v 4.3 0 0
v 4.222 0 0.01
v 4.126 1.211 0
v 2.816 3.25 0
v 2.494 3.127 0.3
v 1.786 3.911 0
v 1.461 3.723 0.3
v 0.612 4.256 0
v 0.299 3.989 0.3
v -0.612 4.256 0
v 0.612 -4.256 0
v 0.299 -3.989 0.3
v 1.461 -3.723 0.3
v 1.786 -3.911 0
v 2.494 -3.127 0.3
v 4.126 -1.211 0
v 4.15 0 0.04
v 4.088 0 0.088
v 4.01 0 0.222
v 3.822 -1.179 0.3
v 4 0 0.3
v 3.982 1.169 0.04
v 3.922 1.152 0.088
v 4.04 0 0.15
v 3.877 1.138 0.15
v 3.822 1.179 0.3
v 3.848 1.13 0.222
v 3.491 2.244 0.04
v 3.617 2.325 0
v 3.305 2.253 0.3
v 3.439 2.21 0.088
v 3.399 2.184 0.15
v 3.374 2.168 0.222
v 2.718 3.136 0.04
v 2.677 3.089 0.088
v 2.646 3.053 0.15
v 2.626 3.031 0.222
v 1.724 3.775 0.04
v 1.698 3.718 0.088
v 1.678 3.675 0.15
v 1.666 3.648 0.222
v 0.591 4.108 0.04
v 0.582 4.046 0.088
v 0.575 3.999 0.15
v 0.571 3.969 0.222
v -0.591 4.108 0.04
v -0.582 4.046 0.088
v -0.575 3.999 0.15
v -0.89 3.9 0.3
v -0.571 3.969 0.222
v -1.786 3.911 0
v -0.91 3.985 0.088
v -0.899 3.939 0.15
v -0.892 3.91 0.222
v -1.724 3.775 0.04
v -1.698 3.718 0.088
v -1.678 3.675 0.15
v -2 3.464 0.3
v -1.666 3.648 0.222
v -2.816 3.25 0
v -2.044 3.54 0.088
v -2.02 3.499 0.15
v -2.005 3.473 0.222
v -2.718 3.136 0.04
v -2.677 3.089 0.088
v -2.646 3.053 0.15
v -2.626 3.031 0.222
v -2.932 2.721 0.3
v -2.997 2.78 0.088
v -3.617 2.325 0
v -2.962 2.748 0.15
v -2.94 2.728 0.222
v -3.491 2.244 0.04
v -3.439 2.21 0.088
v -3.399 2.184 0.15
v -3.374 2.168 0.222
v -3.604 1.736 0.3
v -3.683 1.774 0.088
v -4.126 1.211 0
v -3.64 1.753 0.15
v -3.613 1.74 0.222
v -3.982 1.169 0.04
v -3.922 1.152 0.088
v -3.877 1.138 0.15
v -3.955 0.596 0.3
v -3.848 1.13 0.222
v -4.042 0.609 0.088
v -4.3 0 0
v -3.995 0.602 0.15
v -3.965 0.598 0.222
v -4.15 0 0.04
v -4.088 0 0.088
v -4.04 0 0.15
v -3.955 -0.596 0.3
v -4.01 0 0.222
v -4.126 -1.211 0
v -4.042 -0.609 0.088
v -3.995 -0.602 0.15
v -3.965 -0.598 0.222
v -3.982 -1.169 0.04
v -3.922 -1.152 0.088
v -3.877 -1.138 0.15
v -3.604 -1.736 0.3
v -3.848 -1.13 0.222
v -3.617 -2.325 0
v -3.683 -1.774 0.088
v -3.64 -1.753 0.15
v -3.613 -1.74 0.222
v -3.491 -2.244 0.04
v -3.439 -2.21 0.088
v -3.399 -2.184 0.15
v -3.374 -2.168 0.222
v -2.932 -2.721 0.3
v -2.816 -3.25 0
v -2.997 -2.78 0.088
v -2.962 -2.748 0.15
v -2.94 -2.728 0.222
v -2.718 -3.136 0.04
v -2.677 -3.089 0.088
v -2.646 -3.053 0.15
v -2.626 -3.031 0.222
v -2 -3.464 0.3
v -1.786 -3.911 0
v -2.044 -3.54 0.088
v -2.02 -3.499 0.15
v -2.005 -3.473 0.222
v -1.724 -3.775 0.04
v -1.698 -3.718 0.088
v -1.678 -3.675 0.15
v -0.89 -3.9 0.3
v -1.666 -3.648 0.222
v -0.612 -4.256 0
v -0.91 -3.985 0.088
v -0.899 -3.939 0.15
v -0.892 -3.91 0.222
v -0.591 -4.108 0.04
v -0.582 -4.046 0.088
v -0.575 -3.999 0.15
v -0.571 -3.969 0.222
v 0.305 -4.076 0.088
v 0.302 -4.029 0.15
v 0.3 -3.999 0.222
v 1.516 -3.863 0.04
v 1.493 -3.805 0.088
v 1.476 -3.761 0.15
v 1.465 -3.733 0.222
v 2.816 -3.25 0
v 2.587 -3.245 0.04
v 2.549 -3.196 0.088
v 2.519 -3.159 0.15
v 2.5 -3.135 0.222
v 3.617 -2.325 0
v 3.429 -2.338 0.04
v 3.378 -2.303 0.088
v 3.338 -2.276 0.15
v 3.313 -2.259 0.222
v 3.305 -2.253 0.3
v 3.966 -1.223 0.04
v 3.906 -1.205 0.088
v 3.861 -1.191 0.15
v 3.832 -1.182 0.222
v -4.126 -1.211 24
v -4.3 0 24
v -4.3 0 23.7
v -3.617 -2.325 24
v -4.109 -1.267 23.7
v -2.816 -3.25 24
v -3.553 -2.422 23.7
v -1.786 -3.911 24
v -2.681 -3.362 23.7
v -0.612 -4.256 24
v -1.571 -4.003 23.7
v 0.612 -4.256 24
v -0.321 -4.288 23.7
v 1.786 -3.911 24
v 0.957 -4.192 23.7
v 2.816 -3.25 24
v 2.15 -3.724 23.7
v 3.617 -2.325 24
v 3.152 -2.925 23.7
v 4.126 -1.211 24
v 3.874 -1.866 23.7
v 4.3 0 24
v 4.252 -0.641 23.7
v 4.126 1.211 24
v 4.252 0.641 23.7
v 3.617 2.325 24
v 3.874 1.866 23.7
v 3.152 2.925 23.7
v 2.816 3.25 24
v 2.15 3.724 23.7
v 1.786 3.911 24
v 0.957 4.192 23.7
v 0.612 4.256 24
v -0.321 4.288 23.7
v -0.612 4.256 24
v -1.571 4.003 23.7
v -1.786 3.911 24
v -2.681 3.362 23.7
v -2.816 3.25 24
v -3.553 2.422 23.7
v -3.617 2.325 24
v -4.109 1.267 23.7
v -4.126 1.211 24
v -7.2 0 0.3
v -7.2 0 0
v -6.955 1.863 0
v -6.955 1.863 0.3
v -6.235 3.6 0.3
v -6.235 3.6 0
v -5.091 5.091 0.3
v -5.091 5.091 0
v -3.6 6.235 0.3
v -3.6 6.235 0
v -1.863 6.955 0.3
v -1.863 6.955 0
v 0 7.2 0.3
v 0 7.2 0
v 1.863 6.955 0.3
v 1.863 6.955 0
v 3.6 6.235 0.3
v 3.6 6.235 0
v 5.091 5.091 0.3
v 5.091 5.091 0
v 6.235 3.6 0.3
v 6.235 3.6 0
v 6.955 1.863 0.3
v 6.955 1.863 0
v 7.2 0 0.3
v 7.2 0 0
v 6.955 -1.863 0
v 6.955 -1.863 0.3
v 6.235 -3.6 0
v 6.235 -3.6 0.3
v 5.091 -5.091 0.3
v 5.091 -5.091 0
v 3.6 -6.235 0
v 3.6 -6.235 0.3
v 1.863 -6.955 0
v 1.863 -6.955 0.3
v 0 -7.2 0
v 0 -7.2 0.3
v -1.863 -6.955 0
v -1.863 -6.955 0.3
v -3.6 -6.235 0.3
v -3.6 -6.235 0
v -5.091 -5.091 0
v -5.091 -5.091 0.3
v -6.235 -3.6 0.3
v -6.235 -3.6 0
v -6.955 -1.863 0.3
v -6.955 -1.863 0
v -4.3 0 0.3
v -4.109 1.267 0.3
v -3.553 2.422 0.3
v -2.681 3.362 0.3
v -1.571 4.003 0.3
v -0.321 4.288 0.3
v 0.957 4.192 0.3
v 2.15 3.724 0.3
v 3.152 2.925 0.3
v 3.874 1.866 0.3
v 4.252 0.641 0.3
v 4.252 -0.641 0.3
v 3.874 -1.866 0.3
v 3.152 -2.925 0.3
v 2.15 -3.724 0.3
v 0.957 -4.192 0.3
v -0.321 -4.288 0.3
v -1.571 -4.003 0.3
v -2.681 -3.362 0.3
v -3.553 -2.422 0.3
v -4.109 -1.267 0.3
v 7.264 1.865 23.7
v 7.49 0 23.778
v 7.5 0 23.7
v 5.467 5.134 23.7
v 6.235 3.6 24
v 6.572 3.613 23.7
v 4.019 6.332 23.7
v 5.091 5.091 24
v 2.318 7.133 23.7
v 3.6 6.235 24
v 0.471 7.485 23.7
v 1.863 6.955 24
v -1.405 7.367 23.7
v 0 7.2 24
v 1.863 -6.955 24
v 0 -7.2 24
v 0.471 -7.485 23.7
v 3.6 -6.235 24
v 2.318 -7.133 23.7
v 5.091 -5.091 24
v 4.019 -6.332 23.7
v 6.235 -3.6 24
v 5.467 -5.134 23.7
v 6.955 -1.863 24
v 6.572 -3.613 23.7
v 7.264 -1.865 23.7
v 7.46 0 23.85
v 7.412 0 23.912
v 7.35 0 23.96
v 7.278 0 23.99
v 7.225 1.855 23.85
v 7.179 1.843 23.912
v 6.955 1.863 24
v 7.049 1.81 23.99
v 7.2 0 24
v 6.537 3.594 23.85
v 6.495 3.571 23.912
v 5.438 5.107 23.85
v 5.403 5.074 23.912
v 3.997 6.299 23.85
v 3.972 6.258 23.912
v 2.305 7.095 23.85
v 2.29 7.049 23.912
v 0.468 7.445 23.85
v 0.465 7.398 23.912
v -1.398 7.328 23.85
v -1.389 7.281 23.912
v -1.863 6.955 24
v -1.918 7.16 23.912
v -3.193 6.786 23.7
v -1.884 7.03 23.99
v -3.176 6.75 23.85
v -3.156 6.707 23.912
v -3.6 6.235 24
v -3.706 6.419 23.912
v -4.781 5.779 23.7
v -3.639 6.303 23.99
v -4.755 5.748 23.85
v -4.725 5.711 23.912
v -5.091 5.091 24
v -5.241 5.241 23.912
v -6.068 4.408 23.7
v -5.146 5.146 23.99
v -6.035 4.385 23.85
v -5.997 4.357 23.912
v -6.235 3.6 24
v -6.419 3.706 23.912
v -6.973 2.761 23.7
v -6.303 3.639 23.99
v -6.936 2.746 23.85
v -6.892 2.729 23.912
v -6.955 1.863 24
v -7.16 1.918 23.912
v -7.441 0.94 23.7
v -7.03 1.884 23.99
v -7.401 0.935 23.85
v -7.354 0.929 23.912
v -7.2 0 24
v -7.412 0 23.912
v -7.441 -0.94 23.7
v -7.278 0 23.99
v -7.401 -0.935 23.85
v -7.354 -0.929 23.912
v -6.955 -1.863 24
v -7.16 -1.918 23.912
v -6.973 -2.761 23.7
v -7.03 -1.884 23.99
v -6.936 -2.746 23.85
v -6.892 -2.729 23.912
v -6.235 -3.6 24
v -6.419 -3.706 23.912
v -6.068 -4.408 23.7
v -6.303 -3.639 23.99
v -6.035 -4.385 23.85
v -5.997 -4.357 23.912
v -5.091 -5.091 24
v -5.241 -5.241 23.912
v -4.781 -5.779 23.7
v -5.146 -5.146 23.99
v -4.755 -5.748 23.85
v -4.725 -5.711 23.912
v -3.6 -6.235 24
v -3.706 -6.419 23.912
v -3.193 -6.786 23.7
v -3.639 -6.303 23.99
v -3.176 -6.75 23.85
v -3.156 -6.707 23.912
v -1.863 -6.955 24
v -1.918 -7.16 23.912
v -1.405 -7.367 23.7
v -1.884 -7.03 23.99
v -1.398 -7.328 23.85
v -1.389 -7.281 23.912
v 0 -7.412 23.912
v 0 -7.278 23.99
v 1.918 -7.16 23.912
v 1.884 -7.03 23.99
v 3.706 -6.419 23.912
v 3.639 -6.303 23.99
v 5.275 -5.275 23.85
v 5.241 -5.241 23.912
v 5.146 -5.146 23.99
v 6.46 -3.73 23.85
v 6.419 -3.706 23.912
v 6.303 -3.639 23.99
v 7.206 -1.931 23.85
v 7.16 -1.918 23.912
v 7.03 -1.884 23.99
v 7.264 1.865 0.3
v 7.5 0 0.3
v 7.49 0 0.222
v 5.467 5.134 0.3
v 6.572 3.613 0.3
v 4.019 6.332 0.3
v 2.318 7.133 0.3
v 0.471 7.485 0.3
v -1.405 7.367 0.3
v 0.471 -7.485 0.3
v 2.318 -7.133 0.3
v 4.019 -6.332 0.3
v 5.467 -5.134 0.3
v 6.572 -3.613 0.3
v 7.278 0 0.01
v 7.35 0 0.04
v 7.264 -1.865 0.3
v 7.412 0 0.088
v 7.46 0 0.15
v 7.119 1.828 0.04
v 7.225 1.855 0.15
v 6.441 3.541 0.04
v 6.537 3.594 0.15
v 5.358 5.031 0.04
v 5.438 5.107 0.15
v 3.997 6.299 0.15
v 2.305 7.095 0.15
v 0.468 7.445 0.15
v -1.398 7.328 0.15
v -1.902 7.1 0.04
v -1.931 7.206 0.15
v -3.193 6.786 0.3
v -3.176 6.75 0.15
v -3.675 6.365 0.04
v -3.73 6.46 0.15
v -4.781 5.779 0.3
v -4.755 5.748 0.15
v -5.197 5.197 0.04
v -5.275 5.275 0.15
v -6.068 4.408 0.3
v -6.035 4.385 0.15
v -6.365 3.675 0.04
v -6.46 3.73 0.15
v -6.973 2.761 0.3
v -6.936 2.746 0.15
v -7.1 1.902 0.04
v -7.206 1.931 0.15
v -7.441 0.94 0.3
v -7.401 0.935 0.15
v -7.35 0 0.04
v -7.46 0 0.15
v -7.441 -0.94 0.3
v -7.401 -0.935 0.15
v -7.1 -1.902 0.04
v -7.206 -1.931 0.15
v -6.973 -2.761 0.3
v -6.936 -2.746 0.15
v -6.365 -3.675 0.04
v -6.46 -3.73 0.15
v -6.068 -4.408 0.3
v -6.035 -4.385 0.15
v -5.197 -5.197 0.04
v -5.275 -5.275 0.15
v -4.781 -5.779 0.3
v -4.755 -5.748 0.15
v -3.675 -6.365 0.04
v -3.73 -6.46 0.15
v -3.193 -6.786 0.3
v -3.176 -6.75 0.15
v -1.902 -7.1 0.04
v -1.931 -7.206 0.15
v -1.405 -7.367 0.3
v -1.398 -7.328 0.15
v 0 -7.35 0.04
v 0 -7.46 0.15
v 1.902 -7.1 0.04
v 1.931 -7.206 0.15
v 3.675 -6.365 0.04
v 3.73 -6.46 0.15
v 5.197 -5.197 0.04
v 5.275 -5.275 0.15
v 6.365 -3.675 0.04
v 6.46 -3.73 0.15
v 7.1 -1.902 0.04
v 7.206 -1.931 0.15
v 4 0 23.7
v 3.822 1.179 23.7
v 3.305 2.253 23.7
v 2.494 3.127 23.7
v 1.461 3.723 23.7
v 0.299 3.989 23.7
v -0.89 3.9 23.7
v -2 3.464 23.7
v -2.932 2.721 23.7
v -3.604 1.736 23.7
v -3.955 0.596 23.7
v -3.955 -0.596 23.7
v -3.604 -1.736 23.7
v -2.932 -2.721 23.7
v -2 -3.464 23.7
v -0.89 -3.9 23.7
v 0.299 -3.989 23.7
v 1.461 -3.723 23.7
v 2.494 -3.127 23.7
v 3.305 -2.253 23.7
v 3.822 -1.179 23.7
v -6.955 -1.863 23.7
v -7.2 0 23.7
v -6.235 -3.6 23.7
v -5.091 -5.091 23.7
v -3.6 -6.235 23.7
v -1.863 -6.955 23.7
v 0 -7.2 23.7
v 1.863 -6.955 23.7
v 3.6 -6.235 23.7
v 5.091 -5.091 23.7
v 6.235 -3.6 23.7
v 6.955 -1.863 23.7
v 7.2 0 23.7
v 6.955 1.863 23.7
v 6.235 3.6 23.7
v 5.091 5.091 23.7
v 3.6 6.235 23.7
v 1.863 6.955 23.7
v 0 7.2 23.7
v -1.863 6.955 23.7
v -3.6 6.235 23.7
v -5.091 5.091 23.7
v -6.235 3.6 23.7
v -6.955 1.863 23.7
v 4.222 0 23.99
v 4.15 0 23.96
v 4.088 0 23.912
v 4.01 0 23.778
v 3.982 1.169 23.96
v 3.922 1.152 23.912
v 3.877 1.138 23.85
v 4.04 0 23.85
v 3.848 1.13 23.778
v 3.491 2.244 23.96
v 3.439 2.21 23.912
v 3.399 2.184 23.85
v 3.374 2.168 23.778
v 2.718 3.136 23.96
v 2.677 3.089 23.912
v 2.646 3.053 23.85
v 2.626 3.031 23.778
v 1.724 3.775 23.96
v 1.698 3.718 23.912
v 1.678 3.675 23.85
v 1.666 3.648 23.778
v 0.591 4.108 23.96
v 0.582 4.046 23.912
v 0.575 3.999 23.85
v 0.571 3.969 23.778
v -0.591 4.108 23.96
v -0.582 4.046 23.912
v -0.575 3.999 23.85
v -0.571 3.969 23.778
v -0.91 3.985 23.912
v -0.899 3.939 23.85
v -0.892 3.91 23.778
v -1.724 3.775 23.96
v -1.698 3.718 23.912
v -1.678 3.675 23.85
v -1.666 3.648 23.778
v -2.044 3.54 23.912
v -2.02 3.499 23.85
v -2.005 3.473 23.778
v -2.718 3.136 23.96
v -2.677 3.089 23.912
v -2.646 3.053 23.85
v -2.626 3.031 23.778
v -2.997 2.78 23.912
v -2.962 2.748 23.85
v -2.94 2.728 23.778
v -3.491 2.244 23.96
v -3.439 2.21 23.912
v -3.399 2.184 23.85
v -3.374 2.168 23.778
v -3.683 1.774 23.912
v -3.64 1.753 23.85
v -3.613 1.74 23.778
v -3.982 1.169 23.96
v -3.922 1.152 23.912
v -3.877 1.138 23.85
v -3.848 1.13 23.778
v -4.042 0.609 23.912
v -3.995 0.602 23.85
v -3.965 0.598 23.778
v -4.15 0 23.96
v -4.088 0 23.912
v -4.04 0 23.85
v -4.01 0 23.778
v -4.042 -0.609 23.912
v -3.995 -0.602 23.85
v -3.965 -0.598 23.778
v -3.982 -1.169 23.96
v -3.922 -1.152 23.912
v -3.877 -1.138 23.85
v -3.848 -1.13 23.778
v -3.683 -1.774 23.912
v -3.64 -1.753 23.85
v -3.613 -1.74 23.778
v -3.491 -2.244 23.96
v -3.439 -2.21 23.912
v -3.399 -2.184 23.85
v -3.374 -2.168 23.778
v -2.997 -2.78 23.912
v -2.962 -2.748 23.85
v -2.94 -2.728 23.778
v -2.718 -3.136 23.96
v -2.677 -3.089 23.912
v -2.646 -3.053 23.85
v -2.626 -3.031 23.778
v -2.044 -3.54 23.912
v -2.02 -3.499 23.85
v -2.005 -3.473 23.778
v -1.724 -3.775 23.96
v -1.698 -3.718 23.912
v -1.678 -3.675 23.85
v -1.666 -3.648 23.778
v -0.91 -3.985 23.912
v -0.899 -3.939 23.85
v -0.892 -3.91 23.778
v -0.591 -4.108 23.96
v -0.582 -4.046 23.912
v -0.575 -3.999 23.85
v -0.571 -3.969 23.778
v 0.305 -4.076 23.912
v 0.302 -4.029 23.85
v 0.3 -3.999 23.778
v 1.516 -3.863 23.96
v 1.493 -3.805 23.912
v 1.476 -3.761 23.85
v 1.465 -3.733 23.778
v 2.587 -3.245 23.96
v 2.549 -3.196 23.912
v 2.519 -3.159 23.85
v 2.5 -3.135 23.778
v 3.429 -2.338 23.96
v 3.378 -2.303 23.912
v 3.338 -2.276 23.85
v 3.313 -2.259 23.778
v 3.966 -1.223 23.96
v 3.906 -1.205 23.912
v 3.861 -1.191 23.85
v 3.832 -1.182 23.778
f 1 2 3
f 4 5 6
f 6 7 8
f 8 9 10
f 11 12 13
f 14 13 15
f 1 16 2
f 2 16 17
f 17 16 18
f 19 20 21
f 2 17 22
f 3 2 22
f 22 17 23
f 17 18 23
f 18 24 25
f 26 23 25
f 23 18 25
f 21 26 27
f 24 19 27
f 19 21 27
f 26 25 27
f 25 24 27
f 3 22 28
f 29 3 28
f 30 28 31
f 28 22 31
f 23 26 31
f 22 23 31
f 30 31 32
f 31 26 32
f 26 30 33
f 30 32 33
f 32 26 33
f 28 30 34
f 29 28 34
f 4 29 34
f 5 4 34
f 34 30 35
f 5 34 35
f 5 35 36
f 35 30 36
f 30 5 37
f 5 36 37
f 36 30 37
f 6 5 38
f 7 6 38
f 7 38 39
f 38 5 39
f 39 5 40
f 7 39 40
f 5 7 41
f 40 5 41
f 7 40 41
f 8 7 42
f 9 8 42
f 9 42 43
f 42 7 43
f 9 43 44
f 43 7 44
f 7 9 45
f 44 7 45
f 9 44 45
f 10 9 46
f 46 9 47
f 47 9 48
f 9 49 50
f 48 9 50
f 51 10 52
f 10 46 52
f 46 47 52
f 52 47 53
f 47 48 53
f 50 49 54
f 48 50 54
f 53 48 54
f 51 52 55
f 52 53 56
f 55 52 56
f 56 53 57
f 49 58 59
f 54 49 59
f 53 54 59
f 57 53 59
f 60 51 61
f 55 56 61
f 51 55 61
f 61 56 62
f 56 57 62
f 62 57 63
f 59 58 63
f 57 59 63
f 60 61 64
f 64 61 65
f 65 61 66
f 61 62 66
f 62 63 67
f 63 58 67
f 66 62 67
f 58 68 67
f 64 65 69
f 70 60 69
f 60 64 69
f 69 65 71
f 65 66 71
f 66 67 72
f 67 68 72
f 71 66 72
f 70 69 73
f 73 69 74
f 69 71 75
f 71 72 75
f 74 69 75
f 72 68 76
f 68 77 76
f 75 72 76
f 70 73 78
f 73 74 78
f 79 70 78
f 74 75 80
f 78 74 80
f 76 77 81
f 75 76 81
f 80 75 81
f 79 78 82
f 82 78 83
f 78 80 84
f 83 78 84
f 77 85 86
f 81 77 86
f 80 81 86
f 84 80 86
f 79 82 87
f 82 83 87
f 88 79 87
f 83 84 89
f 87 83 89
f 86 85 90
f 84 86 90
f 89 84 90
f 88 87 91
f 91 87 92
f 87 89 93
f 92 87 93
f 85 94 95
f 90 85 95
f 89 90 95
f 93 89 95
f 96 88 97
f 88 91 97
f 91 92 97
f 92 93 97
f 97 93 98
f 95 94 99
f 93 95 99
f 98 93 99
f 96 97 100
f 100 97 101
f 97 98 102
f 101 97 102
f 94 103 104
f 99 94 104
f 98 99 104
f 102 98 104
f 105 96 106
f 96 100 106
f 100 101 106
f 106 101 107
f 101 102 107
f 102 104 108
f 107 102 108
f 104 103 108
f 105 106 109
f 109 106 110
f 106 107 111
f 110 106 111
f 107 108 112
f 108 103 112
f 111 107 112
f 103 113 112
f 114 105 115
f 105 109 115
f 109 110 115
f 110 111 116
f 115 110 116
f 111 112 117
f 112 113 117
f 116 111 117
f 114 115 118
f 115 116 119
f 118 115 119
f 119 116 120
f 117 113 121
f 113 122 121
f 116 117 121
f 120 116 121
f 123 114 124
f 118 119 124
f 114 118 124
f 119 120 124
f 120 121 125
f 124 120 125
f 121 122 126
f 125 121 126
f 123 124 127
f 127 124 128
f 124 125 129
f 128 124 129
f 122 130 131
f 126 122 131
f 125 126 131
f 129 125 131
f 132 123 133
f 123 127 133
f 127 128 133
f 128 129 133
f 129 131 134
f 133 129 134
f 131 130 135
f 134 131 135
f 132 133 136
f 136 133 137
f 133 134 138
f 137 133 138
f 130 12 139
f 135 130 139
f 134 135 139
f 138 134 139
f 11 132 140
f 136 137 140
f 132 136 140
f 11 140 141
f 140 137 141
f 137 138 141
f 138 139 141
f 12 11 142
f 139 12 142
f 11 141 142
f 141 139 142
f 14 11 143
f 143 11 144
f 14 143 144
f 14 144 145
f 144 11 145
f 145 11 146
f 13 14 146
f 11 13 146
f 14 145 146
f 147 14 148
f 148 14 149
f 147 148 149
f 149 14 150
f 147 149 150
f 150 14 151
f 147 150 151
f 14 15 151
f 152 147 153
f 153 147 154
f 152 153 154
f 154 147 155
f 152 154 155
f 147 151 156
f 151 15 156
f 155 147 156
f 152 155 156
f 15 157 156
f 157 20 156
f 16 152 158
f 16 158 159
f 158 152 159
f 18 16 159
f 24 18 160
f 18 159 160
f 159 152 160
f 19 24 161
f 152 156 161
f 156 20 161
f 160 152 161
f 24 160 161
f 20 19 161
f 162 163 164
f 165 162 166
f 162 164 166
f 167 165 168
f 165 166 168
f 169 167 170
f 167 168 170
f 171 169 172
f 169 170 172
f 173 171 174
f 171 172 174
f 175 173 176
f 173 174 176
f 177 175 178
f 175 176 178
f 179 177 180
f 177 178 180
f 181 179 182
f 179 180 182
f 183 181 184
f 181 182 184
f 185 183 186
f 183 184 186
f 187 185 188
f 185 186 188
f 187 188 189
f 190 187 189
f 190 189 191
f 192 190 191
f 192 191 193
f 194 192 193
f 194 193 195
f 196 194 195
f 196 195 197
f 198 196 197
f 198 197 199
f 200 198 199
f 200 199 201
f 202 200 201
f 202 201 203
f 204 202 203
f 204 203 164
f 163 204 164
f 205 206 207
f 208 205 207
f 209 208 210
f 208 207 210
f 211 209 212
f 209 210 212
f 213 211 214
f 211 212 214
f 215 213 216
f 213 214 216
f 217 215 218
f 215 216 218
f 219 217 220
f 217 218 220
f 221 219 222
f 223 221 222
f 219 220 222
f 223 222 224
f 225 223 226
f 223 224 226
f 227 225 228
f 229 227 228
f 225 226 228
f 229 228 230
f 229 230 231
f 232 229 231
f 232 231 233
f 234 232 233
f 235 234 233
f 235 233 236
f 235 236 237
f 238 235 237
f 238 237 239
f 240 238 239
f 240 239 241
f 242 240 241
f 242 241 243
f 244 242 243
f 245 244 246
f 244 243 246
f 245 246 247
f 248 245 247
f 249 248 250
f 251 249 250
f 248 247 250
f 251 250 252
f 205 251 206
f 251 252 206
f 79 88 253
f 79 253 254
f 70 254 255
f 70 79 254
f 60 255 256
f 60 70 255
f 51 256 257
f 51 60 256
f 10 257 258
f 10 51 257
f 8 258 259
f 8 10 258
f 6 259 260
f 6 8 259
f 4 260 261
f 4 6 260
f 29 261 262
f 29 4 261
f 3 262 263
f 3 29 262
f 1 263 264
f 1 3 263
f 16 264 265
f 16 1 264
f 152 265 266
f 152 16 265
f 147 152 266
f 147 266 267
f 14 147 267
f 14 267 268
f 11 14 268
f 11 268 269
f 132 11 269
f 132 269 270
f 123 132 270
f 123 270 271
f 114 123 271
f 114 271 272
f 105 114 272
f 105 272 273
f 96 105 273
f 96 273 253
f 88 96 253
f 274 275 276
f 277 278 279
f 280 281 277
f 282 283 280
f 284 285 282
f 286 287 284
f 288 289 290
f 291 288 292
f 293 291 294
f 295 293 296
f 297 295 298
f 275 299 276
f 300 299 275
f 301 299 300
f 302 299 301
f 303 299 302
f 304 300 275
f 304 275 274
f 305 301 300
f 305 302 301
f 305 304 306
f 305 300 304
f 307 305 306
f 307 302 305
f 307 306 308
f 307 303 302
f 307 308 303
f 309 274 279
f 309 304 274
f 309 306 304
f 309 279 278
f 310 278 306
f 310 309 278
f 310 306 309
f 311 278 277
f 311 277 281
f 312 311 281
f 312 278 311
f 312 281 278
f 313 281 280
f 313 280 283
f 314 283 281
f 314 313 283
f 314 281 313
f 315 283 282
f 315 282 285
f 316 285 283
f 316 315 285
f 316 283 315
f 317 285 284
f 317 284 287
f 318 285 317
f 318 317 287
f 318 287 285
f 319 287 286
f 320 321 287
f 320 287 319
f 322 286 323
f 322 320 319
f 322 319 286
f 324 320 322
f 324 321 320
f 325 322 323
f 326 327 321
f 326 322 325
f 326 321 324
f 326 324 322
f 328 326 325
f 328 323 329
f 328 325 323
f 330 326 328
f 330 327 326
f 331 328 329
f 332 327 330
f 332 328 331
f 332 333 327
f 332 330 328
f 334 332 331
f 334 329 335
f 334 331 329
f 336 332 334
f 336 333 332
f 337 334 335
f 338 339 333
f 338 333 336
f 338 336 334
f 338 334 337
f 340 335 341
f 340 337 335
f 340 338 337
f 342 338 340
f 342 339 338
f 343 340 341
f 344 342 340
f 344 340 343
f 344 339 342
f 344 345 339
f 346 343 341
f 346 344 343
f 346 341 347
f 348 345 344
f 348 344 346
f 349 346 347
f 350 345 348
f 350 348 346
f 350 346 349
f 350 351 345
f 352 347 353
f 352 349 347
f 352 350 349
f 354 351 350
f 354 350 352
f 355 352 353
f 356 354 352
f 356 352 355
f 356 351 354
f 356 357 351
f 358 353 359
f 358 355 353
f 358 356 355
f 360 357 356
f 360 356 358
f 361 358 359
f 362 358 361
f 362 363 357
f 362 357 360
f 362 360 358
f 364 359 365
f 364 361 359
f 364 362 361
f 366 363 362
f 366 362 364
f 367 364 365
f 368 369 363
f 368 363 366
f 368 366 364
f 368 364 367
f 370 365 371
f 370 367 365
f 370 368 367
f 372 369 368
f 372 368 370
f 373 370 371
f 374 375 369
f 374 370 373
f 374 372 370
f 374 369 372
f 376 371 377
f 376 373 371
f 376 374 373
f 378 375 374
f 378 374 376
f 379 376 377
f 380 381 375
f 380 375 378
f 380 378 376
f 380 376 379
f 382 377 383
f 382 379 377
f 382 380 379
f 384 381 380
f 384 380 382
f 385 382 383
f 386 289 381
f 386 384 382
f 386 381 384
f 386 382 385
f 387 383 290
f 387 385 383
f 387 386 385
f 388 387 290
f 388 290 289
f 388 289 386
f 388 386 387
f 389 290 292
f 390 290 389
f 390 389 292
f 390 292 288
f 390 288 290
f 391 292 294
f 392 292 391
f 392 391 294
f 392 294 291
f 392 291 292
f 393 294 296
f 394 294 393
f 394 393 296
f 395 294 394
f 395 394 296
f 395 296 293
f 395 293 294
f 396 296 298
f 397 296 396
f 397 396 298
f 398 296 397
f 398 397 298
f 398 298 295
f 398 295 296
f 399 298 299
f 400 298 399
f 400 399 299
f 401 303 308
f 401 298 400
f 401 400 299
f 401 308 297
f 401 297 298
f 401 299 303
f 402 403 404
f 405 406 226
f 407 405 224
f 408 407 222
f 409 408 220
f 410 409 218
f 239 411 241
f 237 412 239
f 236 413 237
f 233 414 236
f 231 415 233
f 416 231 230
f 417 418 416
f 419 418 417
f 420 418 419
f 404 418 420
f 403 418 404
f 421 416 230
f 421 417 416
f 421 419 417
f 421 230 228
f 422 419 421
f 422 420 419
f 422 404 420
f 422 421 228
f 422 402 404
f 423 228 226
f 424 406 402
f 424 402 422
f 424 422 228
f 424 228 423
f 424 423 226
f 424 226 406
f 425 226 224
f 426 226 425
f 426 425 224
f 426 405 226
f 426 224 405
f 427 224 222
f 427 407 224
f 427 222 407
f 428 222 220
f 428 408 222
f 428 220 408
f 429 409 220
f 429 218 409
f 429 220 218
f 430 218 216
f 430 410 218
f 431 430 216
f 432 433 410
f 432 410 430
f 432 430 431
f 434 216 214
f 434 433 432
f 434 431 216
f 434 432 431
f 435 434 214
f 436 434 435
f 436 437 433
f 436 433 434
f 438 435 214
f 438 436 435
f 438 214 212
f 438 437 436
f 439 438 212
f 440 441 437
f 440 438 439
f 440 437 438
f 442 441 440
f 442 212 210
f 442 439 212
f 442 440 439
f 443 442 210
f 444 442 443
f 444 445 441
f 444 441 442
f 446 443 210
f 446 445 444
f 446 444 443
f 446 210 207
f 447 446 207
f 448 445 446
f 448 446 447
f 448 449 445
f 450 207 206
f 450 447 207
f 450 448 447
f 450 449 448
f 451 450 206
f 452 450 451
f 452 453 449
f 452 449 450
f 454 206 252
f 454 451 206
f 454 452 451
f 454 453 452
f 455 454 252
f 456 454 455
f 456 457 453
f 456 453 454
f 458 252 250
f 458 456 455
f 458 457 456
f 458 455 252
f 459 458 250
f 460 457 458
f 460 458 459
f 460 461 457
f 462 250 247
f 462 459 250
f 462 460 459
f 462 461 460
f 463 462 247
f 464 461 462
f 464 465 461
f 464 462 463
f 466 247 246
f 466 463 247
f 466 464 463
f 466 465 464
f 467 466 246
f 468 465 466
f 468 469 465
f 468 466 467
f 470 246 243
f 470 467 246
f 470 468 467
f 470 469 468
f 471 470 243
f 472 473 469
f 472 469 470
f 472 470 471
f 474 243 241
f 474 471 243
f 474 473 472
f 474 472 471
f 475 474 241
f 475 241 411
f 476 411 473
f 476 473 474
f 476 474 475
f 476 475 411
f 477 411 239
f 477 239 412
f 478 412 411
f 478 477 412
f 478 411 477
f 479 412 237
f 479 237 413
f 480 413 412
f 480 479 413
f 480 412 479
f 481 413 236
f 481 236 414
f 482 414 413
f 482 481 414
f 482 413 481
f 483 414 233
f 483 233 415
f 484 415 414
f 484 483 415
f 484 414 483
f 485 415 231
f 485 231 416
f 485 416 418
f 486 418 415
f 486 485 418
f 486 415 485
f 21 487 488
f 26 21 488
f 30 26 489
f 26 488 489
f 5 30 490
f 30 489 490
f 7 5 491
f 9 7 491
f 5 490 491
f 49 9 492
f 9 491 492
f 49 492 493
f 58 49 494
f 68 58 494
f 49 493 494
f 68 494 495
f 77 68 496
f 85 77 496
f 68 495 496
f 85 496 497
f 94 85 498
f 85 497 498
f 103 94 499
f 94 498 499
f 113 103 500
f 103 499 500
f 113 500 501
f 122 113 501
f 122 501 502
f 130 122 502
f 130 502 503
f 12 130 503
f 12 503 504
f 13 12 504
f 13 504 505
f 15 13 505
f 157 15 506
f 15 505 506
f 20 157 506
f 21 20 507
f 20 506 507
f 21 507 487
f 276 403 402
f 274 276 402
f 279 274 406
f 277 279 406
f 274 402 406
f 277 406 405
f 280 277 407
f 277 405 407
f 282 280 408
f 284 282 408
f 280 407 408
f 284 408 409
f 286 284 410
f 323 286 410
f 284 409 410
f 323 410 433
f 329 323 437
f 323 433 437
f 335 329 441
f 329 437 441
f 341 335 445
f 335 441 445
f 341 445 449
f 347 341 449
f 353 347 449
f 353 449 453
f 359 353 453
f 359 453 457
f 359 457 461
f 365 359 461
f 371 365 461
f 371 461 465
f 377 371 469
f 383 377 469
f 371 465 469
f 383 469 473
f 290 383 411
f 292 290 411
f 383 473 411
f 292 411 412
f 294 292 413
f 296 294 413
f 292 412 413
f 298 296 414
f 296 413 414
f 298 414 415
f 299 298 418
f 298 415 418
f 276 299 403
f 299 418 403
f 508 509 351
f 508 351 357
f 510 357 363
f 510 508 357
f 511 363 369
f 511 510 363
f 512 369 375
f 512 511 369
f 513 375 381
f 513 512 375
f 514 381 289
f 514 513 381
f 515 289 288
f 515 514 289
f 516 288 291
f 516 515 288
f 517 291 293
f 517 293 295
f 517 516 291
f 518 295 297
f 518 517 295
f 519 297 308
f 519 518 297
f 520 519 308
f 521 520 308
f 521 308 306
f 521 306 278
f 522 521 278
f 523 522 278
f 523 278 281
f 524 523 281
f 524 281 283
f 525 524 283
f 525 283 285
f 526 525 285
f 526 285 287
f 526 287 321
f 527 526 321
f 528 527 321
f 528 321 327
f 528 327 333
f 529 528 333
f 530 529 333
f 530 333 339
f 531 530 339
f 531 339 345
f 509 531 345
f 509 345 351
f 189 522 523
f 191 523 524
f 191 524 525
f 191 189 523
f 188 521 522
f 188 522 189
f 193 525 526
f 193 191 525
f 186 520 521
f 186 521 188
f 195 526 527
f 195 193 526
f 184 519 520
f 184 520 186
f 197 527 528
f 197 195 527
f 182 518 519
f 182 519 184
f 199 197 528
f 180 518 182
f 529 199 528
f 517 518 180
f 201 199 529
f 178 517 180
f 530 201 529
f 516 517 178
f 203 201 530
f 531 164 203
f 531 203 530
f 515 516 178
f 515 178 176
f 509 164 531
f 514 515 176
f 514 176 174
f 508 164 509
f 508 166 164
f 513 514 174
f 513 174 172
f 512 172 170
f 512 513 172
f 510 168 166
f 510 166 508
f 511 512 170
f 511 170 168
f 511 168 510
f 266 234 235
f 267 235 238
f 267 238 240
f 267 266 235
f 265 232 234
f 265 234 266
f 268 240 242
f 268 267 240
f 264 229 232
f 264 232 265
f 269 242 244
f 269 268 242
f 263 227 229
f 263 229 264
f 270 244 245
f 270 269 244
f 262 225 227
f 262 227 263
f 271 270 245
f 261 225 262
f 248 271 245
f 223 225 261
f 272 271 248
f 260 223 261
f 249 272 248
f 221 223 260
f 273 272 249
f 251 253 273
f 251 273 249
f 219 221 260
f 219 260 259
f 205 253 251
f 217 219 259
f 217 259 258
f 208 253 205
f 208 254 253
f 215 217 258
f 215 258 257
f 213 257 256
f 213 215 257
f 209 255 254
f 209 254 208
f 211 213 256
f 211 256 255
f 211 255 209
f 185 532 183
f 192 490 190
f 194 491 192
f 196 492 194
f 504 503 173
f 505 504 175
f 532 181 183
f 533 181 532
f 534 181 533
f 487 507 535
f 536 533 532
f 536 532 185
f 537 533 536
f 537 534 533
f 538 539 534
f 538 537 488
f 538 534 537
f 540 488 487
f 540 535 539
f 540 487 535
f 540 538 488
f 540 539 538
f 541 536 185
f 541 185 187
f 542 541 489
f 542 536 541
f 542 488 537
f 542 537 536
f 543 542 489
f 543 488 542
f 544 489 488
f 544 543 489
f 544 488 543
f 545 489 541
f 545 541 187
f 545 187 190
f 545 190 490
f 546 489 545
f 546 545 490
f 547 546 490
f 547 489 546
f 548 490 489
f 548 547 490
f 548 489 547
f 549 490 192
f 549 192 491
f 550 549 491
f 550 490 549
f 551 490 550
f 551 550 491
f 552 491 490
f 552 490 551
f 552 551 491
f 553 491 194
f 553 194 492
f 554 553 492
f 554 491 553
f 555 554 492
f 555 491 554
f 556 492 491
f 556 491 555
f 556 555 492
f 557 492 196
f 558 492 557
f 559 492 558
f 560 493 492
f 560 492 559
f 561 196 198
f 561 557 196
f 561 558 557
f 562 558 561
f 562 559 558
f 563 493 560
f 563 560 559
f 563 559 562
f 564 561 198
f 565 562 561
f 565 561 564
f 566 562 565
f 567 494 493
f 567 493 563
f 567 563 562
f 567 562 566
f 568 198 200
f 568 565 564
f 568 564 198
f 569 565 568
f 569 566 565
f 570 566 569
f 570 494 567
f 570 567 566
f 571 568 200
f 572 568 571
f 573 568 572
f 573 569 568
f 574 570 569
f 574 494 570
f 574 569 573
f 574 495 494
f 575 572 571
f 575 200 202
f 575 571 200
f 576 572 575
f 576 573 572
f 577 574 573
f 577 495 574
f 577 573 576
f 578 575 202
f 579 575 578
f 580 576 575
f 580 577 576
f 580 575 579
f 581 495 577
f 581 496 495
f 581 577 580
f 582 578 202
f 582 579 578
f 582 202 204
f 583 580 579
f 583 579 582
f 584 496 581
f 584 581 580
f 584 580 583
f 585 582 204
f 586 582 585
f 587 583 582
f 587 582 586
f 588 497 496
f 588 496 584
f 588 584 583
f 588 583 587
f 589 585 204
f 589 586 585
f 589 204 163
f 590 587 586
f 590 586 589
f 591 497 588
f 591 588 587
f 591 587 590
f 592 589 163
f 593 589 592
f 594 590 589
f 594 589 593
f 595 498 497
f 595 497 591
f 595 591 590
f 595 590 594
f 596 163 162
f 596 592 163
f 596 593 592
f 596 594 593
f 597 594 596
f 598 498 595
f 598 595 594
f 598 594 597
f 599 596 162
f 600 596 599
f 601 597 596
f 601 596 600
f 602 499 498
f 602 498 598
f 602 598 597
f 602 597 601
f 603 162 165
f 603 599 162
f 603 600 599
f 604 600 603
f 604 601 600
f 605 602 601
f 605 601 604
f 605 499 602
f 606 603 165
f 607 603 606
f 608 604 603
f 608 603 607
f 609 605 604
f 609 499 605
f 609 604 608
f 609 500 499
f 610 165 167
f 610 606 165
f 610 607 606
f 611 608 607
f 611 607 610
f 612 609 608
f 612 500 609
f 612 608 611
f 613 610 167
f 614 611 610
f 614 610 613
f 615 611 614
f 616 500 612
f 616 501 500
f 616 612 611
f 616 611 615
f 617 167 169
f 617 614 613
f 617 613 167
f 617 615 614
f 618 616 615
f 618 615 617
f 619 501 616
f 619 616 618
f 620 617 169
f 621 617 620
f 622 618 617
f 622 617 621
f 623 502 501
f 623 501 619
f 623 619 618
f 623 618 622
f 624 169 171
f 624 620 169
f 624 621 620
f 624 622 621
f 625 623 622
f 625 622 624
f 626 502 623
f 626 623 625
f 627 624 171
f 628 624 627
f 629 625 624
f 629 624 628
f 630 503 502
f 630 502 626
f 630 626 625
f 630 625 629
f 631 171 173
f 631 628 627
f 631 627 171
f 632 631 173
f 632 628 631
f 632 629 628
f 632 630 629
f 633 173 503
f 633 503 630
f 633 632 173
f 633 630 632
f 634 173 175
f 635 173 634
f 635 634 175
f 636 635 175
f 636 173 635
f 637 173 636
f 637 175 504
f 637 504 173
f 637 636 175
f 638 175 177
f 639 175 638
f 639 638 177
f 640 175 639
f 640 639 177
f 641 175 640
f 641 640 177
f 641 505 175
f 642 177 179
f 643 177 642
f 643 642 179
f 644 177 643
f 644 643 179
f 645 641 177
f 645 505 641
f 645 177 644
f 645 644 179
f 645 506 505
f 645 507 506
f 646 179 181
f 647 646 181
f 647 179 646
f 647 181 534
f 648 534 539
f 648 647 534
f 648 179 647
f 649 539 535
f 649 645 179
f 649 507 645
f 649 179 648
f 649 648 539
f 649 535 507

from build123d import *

# Parameters (mm, degrees)
SKETCH1_R           = 7.5
BOSS_EXTRUDE1_DEPTH = 24
SKETCH2_R           = 4
CUT_EXTRUDE1_DEPTH  = 24
FILLET2_R           = 0.3
FILLET3_R           = 0.3
SKETCH3_R           = 7.2
SKETCH3_R_2         = 4.3
CUT_EXTRUDE2_DEPTH  = 0.3
CUT_EXTRUDE4_START  = -0.3
SKETCH4_R           = 7.2
SKETCH4_R_2         = 4.3
CUT_EXTRUDE4_DEPTH  = 0.3


with BuildPart() as part:
    # Sketch1 → Boss-Extrude1 (new body)
    with BuildSketch(Plane.XY):
        Circle(SKETCH1_R)
    extrude(amount=BOSS_EXTRUDE1_DEPTH)

    # Sketch2 → Cut-Extrude1 (cut)
    with BuildSketch(Plane.XY.offset(24)):
        Circle(SKETCH2_R)
    extrude(amount=-CUT_EXTRUDE1_DEPTH, mode=Mode.SUBTRACT)

    # Fillet2
    fillet2_edges = [part.edges().sort_by_distance(p)[0] for p in [
        (-4, 0, 0),
        (-4, 0, 24),
    ]]
    fillet(fillet2_edges, radius=FILLET2_R)

    # Fillet3
    fillet3_edges = [part.edges().sort_by_distance(p)[0] for p in [
        (-7.5, 0, 0),
        (-7.5, 0, 24),
    ]]
    fillet(fillet3_edges, radius=FILLET3_R)

    # Sketch3 → Cut-Extrude2 (cut)
    with BuildSketch(Plane(origin=(0, 0, 0), x_dir=(-1, 0, 0), z_dir=(0, 0, -1))):
        Circle(SKETCH3_R)
        Circle(SKETCH3_R_2, mode=Mode.SUBTRACT)
    extrude(amount=-CUT_EXTRUDE2_DEPTH, mode=Mode.SUBTRACT)

    # Sketch4 → Cut-Extrude4 (cut)
    with BuildSketch(Plane.XY.offset(24).offset(CUT_EXTRUDE4_START)):
        with Locations(Location((0, 0, 0), (0, 0, 180))):
            Circle(SKETCH4_R)
        with Locations(Location((0, 0, 0), (0, 0, 180))):
            Circle(SKETCH4_R_2, mode=Mode.SUBTRACT)
    extrude(amount=CUT_EXTRUDE4_DEPTH, mode=Mode.SUBTRACT)


solid = part.part
